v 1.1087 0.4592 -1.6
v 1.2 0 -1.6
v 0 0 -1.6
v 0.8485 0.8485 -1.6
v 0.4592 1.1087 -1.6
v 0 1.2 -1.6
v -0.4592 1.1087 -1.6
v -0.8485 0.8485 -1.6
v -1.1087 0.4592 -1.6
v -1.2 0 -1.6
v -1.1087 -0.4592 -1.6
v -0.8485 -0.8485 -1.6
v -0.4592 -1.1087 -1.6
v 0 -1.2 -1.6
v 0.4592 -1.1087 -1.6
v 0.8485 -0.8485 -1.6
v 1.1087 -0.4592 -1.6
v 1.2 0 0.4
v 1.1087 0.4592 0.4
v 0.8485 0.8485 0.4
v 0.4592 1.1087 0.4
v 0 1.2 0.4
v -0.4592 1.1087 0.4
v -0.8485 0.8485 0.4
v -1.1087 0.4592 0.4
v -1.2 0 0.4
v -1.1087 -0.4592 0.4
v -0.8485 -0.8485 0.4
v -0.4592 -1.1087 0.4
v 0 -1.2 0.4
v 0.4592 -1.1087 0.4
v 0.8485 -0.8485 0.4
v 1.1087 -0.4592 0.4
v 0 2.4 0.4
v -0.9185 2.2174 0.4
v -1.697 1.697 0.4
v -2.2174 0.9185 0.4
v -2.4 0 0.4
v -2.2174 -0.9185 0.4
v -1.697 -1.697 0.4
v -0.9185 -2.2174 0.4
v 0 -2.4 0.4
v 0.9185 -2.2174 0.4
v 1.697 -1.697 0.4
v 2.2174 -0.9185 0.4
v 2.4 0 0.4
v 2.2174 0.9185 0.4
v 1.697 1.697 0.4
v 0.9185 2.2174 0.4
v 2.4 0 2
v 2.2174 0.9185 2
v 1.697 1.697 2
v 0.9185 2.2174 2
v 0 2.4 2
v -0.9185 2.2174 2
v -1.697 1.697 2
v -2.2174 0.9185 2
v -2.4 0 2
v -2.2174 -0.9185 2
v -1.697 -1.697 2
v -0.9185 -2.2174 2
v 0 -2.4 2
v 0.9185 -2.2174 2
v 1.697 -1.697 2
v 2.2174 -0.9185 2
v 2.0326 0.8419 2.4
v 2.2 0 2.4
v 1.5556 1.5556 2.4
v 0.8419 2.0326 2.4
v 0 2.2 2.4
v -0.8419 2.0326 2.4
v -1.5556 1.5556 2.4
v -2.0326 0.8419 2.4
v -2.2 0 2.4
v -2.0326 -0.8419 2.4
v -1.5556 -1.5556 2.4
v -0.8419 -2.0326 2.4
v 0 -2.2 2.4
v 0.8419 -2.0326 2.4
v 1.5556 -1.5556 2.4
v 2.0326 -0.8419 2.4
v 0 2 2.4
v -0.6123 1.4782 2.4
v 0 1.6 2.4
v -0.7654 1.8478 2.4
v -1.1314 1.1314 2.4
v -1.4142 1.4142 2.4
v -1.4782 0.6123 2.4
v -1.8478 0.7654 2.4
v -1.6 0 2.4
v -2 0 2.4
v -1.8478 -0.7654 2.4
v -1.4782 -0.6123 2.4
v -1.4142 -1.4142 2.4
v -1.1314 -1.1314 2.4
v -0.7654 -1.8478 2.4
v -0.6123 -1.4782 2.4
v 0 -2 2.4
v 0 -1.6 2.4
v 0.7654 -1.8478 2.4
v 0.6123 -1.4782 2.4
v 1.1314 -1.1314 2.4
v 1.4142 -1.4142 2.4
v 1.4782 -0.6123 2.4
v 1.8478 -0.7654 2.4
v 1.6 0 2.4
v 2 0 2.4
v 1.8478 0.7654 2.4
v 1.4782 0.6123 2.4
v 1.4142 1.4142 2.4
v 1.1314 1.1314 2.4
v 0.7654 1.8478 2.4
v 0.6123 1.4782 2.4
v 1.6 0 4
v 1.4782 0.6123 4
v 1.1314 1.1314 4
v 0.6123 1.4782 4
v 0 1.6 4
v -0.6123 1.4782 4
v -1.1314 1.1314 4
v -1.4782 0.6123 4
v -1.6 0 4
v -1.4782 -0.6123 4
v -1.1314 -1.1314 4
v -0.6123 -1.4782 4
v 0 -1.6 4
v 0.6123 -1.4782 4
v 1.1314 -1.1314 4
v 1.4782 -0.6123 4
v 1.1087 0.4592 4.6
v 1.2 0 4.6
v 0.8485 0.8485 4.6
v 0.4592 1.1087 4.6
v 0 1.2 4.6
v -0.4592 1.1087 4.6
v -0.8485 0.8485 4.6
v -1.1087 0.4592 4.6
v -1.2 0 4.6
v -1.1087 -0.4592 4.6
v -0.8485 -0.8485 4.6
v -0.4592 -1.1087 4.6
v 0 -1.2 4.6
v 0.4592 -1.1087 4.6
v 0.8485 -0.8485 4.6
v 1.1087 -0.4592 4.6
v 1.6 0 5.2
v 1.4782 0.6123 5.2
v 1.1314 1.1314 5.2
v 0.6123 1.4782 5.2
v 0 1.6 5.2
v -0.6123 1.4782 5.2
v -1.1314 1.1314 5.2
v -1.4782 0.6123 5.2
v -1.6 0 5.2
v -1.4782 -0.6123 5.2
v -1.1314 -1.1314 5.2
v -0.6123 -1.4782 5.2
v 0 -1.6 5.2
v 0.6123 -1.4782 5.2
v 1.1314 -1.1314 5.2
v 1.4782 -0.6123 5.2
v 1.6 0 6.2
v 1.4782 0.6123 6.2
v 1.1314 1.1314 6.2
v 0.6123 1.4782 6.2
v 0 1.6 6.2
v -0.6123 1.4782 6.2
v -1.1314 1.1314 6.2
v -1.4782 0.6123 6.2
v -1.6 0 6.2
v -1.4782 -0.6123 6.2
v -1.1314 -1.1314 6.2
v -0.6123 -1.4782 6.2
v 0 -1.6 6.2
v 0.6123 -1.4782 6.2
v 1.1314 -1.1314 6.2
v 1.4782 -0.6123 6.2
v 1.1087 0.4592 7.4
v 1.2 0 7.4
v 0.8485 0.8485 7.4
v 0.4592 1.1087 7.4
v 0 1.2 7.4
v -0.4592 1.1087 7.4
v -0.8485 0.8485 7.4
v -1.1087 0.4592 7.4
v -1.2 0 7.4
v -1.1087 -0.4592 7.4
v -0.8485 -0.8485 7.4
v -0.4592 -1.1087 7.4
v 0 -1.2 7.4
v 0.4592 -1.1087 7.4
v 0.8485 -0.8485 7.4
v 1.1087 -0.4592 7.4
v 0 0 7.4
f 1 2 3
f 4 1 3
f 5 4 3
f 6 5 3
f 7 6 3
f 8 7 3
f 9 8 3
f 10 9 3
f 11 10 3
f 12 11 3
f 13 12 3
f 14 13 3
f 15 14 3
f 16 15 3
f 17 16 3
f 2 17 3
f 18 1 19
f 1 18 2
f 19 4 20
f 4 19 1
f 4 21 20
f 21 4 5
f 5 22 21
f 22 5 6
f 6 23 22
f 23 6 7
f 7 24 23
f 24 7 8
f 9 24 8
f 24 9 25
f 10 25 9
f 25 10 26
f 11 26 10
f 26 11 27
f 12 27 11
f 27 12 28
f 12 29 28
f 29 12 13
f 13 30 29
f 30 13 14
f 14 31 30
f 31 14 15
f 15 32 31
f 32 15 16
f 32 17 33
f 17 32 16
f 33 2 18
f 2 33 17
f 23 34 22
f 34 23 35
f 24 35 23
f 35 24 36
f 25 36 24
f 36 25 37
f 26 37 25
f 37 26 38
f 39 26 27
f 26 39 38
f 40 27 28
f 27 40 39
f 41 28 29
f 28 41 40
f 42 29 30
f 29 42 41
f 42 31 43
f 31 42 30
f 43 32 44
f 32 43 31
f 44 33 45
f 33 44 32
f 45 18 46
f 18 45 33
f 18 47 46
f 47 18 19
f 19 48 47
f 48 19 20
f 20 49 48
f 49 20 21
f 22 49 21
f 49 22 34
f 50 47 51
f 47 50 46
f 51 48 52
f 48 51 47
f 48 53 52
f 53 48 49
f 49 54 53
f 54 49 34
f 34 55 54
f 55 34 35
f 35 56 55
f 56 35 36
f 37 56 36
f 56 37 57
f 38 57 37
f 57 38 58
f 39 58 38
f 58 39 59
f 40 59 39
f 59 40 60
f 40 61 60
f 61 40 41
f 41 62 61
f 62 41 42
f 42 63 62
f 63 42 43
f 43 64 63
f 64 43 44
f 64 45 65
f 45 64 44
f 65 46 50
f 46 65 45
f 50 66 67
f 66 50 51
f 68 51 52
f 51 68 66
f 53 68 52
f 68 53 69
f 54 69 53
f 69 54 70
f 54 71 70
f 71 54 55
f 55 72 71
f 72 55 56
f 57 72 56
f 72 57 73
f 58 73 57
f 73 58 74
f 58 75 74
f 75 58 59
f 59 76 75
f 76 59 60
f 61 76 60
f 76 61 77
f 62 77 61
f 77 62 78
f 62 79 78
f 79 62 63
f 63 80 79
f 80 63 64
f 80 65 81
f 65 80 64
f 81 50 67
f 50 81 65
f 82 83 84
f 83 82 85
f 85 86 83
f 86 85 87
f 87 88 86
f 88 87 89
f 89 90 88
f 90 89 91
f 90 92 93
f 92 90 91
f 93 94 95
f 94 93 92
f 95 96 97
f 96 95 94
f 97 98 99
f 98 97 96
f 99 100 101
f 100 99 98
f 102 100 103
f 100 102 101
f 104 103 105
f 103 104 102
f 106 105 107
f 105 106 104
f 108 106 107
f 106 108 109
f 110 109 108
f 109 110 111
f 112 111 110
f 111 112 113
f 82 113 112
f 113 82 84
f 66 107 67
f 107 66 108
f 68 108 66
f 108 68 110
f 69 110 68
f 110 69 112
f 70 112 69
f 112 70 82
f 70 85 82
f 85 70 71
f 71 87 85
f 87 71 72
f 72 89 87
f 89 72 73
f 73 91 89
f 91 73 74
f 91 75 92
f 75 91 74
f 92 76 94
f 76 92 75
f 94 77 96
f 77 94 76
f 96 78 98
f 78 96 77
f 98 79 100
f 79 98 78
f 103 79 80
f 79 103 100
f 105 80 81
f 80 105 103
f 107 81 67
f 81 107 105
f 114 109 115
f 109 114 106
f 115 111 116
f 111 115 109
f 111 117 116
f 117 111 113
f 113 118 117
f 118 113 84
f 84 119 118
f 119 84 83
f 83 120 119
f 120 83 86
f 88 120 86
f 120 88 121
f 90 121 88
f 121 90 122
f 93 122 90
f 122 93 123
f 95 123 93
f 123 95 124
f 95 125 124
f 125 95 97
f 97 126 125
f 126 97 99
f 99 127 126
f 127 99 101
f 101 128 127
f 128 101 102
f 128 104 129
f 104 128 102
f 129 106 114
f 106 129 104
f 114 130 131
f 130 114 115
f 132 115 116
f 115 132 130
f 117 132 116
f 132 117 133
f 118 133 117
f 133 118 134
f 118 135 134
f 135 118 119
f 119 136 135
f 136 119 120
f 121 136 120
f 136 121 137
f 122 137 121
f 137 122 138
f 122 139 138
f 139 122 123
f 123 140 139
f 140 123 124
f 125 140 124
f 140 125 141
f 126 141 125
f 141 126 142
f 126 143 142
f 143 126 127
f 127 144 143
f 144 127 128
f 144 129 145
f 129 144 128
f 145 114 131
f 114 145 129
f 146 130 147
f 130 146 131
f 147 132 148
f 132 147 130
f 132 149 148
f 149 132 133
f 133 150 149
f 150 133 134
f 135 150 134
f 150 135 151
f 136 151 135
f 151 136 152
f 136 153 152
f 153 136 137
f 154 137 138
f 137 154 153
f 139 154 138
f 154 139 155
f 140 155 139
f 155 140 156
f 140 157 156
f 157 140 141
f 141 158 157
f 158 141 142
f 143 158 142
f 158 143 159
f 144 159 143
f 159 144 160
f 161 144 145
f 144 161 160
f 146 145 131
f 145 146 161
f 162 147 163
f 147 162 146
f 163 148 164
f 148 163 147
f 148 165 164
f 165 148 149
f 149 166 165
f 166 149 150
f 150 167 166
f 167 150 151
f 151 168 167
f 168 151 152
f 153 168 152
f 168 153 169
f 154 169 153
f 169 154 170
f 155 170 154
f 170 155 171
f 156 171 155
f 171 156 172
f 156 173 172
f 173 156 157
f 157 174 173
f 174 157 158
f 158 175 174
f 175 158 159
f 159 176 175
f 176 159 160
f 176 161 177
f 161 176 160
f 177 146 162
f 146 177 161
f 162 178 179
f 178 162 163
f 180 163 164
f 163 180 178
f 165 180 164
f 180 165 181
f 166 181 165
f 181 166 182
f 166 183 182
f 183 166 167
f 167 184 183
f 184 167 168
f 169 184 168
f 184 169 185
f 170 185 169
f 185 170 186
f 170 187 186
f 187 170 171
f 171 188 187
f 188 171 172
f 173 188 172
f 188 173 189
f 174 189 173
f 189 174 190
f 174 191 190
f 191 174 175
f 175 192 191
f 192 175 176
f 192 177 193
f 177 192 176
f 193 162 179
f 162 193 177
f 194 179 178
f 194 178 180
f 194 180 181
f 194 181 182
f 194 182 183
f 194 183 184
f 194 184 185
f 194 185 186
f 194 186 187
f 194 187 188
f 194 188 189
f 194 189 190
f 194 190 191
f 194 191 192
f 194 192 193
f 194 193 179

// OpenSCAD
// file: ../p/4-4ring4.scad
use <../lib.scad>
function ldraw_lib__4_4ring4() = [
// 0 Ring  4 x 1.0
// 0 Name: 4-4ring4.dat
// 0 Author: James Jessiman
// 0 !LDRAW_ORG Primitive UPDATE 2009-01
// 0 !LICENSE Licensed under CC BY 4.0 : see CAreadme.txt
// 
// 0 BFC CERTIFY CCW
  [0,"BFC","CERTIFY"],
  [0,"BFC","CCW"],
// 
// 0 !HISTORY 1998-12-15 [PTadmin] Official Update 1998-10
// 0 !HISTORY 2002-04-08 [BrickCaster] Modified for BFC compliance
// 0 !HISTORY 2002-04-25 [PTadmin] Official Update 2002-02
// 0 !HISTORY 2007-06-24 [PTadmin] Header formatted for Contributor Agreement
// 0 !HISTORY 2008-07-01 [PTadmin] Official Update 2008-01
// 0 !HISTORY 2008-08-26 [cwdee] Switch polygon winding and rename
// 0 !HISTORY 2009-05-02 [PTadmin] Official Update 2009-01
// 
// 
// 4 16 -1.9135 0 4.6195 -1.5308 0 3.6956 0 0 4 0 0 5
  [4,16,-1.9135,0,4.6195,-1.5308,0,3.6956,0,0,4,0,0,5],
// 4 16 -3.5355 0 3.5355 -2.8284 0 2.8284 -1.5308 0 3.6956 -1.9135 0 4.6195
  [4,16,-3.5355,0,3.5355,-2.8284,0,2.8284,-1.5308,0,3.6956,-1.9135,0,4.6195],
// 4 16 -4.6195 0 1.9135 -3.6956 0 1.5308 -2.8284 0 2.8284 -3.5355 0 3.5355
  [4,16,-4.6195,0,1.9135,-3.6956,0,1.5308,-2.8284,0,2.8284,-3.5355,0,3.5355],
// 4 16 -5 0 0 -4 0 0 -3.6956 0 1.5308 -4.6195 0 1.9135
  [4,16,-5,0,0,-4,0,0,-3.6956,0,1.5308,-4.6195,0,1.9135],
// 4 16 -4.6195 0 -1.9135 -3.6956 0 -1.5308 -4 0 0 -5 0 0
  [4,16,-4.6195,0,-1.9135,-3.6956,0,-1.5308,-4,0,0,-5,0,0],
// 4 16 -3.5355 0 -3.5355 -2.8284 0 -2.8284 -3.6956 0 -1.5308 -4.6195 0 -1.9135
  [4,16,-3.5355,0,-3.5355,-2.8284,0,-2.8284,-3.6956,0,-1.5308,-4.6195,0,-1.9135],
// 4 16 -1.9135 0 -4.6195 -1.5308 0 -3.6956 -2.8284 0 -2.8284 -3.5355 0 -3.5355
  [4,16,-1.9135,0,-4.6195,-1.5308,0,-3.6956,-2.8284,0,-2.8284,-3.5355,0,-3.5355],
// 4 16 0 0 -5 0 0 -4 -1.5308 0 -3.6956 -1.9135 0 -4.6195
  [4,16,0,0,-5,0,0,-4,-1.5308,0,-3.6956,-1.9135,0,-4.6195],
// 4 16 1.9135 0 -4.6195 1.5308 0 -3.6956 0 0 -4 0 0 -5
  [4,16,1.9135,0,-4.6195,1.5308,0,-3.6956,0,0,-4,0,0,-5],
// 4 16 3.5355 0 -3.5355 2.8284 0 -2.8284 1.5308 0 -3.6956 1.9135 0 -4.6195
  [4,16,3.5355,0,-3.5355,2.8284,0,-2.8284,1.5308,0,-3.6956,1.9135,0,-4.6195],
// 4 16 4.6195 0 -1.9135 3.6956 0 -1.5308 2.8284 0 -2.8284 3.5355 0 -3.5355
  [4,16,4.6195,0,-1.9135,3.6956,0,-1.5308,2.8284,0,-2.8284,3.5355,0,-3.5355],
// 4 16 5 0 0 4 0 0 3.6956 0 -1.5308 4.6195 0 -1.9135
  [4,16,5,0,0,4,0,0,3.6956,0,-1.5308,4.6195,0,-1.9135],
// 4 16 4.6195 0 1.9135 3.6956 0 1.5308 4 0 0 5 0 0
  [4,16,4.6195,0,1.9135,3.6956,0,1.5308,4,0,0,5,0,0],
// 4 16 3.5355 0 3.5355 2.8284 0 2.8284 3.6956 0 1.5308 4.6195 0 1.9135
  [4,16,3.5355,0,3.5355,2.8284,0,2.8284,3.6956,0,1.5308,4.6195,0,1.9135],
// 4 16 1.9135 0 4.6195 1.5308 0 3.6956 2.8284 0 2.8284 3.5355 0 3.5355
  [4,16,1.9135,0,4.6195,1.5308,0,3.6956,2.8284,0,2.8284,3.5355,0,3.5355],
// 4 16 0 0 5 0 0 4 1.5308 0 3.6956 1.9135 0 4.6195
  [4,16,0,0,5,0,0,4,1.5308,0,3.6956,1.9135,0,4.6195],
// 0
];
module ldraw_lib__4_4ring4(step=0, col=false, unit=2/5, alt=false, line=0.2, solid=!$preview)
    makepoly(ldraw_lib__4_4ring4(), step=step, col=col, unit=unit, alt=alt, line=line, solid=solid);
ldraw_lib__4_4ring4(line=0.2);
// file: ../p/4-4ring10.scad
use <../lib.scad>
function ldraw_lib__4_4ring10() = [
// 0 Ring 10 x 1.0
// 0 Name: 4-4ring10.dat
// 0 Author: Paul Easter [pneaster]
// 0 !LDRAW_ORG Primitive UPDATE 2024-02
// 0 !LICENSE Licensed under CC BY 4.0 : see CAreadme.txt
// 
// 0 BFC CERTIFY CCW
  [0,"BFC","CERTIFY"],
  [0,"BFC","CCW"],
// 
// 0 !HISTORY 2004-04-22 [PTadmin] Official Update 2004-02
// 0 !HISTORY 2007-06-24 [PTadmin] Header formatted for Contributor Agreement
// 0 !HISTORY 2008-07-01 [PTadmin] Official Update 2008-01
// 0 !HISTORY 2010-12-19 [MagFors] Corrected with Primitive Generator 2
// 0 !HISTORY 2010-12-31 [PTadmin] Official Update 2010-03
// 0 !HISTORY 2024-03-23 [OrionP] Moved from 4-4rin10.dat
// 0 !HISTORY 2024-03-24 [OrionP] Official Update 2024-02
// 
// 4 16 11 0 0 10.1629 0 4.2097 9.239 0 3.827 10 0 0
  [4,16,11,0,0,10.1629,0,4.2097,9.239,0,3.827,10,0,0],
// 4 16 10.1629 0 4.2097 7.7781 0 7.7781 7.071 0 7.071 9.239 0 3.827
  [4,16,10.1629,0,4.2097,7.7781,0,7.7781,7.071,0,7.071,9.239,0,3.827],
// 4 16 7.7781 0 7.7781 4.2097 0 10.1629 3.827 0 9.239 7.071 0 7.071
  [4,16,7.7781,0,7.7781,4.2097,0,10.1629,3.827,0,9.239,7.071,0,7.071],
// 4 16 4.2097 0 10.1629 0 0 11 0 0 10 3.827 0 9.239
  [4,16,4.2097,0,10.1629,0,0,11,0,0,10,3.827,0,9.239],
// 4 16 0 0 11 -4.2097 0 10.1629 -3.827 0 9.239 0 0 10
  [4,16,0,0,11,-4.2097,0,10.1629,-3.827,0,9.239,0,0,10],
// 4 16 -4.2097 0 10.1629 -7.7781 0 7.7781 -7.071 0 7.071 -3.827 0 9.239
  [4,16,-4.2097,0,10.1629,-7.7781,0,7.7781,-7.071,0,7.071,-3.827,0,9.239],
// 4 16 -7.7781 0 7.7781 -10.1629 0 4.2097 -9.239 0 3.827 -7.071 0 7.071
  [4,16,-7.7781,0,7.7781,-10.1629,0,4.2097,-9.239,0,3.827,-7.071,0,7.071],
// 4 16 -10.1629 0 4.2097 -11 0 0 -10 0 0 -9.239 0 3.827
  [4,16,-10.1629,0,4.2097,-11,0,0,-10,0,0,-9.239,0,3.827],
// 4 16 -11 0 0 -10.1629 0 -4.2097 -9.239 0 -3.827 -10 0 0
  [4,16,-11,0,0,-10.1629,0,-4.2097,-9.239,0,-3.827,-10,0,0],
// 4 16 -10.1629 0 -4.2097 -7.7781 0 -7.7781 -7.071 0 -7.071 -9.239 0 -3.827
  [4,16,-10.1629,0,-4.2097,-7.7781,0,-7.7781,-7.071,0,-7.071,-9.239,0,-3.827],
// 4 16 -7.7781 0 -7.7781 -4.2097 0 -10.1629 -3.827 0 -9.239 -7.071 0 -7.071
  [4,16,-7.7781,0,-7.7781,-4.2097,0,-10.1629,-3.827,0,-9.239,-7.071,0,-7.071],
// 4 16 -4.2097 0 -10.1629 0 0 -11 0 0 -10 -3.827 0 -9.239
  [4,16,-4.2097,0,-10.1629,0,0,-11,0,0,-10,-3.827,0,-9.239],
// 4 16 0 0 -11 4.2097 0 -10.1629 3.827 0 -9.239 0 0 -10
  [4,16,0,0,-11,4.2097,0,-10.1629,3.827,0,-9.239,0,0,-10],
// 4 16 4.2097 0 -10.1629 7.7781 0 -7.7781 7.071 0 -7.071 3.827 0 -9.239
  [4,16,4.2097,0,-10.1629,7.7781,0,-7.7781,7.071,0,-7.071,3.827,0,-9.239],
// 4 16 7.7781 0 -7.7781 10.1629 0 -4.2097 9.239 0 -3.827 7.071 0 -7.071
  [4,16,7.7781,0,-7.7781,10.1629,0,-4.2097,9.239,0,-3.827,7.071,0,-7.071],
// 4 16 10.1629 0 -4.2097 11 0 0 10 0 0 9.239 0 -3.827
  [4,16,10.1629,0,-4.2097,11,0,0,10,0,0,9.239,0,-3.827],
// 0 // Build by Primitive Generator 2
// 
];
module ldraw_lib__4_4ring10(step=0, col=false, unit=2/5, alt=false, line=0.2, solid=!$preview)
    makepoly(ldraw_lib__4_4ring10(), step=step, col=col, unit=unit, alt=alt, line=line, solid=solid);
ldraw_lib__4_4ring10(line=0.2);
// file: ../p/4-4ring1.scad
use <../lib.scad>
function ldraw_lib__4_4ring1() = [
// 0 Ring  1 x 1.0
// 0 Name: 4-4ring1.dat
// 0 Author: James Jessiman
// 0 !LDRAW_ORG Primitive UPDATE 2009-01
// 0 !LICENSE Licensed under CC BY 4.0 : see CAreadme.txt
// 
// 0 BFC CERTIFY CCW
  [0,"BFC","CERTIFY"],
  [0,"BFC","CCW"],
// 
// 0 !HISTORY 1998-12-15 [PTadmin] Official Update 1998-10
// 0 !HISTORY 2002-04-08 [BrickCaster] Modified for BFC compliance
// 0 !HISTORY 2002-04-25 [PTadmin] Official Update 2002-02
// 0 !HISTORY 2007-06-24 [PTadmin] Header formatted for Contributor Agreement
// 0 !HISTORY 2008-07-01 [PTadmin] Official Update 2008-01
// 0 !HISTORY 2008-08-26 [cwdee] Switch polygon winding and rename
// 0 !HISTORY 2009-05-02 [PTadmin] Official Update 2009-01
// 
// 
// 4 16 -0.7654 0 1.8478 -0.3827 0 0.9239 0 0 1 0 0 2
  [4,16,-0.7654,0,1.8478,-0.3827,0,0.9239,0,0,1,0,0,2],
// 4 16 -1.4142 0 1.4142 -0.7071 0 0.7071 -0.3827 0 0.9239 -0.7654 0 1.8478
  [4,16,-1.4142,0,1.4142,-0.7071,0,0.7071,-0.3827,0,0.9239,-0.7654,0,1.8478],
// 4 16 -1.8478 0 0.7654 -0.9239 0 0.3827 -0.7071 0 0.7071 -1.4142 0 1.41420
  [4,16,-1.8478,0,0.7654,-0.9239,0,0.3827,-0.7071,0,0.7071,-1.4142,0,1.41420],
// 4 16 -2 0 0 -1 0 0 -0.9239 0 0.3827 -1.8478 0 0.7654
  [4,16,-2,0,0,-1,0,0,-0.9239,0,0.3827,-1.8478,0,0.7654],
// 4 16 -1.8478 0 -0.7654 -0.9239 0 -0.3827 -1 0 0 -2 0 0
  [4,16,-1.8478,0,-0.7654,-0.9239,0,-0.3827,-1,0,0,-2,0,0],
// 4 16 -1.4142 0 -1.4142 -0.7071 0 -0.7071 -0.9239 0 -0.3827 -1.8478 0 -0.7654
  [4,16,-1.4142,0,-1.4142,-0.7071,0,-0.7071,-0.9239,0,-0.3827,-1.8478,0,-0.7654],
// 4 16 -0.7654 0 -1.8478 -0.3827 0 -0.9239 -0.7071 0 -0.7071 -1.4142 0 -1.4142
  [4,16,-0.7654,0,-1.8478,-0.3827,0,-0.9239,-0.7071,0,-0.7071,-1.4142,0,-1.4142],
// 4 16 0 0 -2 0 0 -1 -0.3827 0 -0.9239 -0.7654 0 -1.8478
  [4,16,0,0,-2,0,0,-1,-0.3827,0,-0.9239,-0.7654,0,-1.8478],
// 4 16 0.7654 0 -1.8478 0.3827 0 -0.9239 0 0 -1 0 0 -2
  [4,16,0.7654,0,-1.8478,0.3827,0,-0.9239,0,0,-1,0,0,-2],
// 4 16 1.4142 0 -1.4142 0.7071 0 -0.7071 0.3827 0 -0.9239 0.7654 0 -1.8478
  [4,16,1.4142,0,-1.4142,0.7071,0,-0.7071,0.3827,0,-0.9239,0.7654,0,-1.8478],
// 4 16 1.8478 0 -0.7654 0.9239 0 -0.3827 0.7071 0 -0.7071 1.4142 0 -1.4142
  [4,16,1.8478,0,-0.7654,0.9239,0,-0.3827,0.7071,0,-0.7071,1.4142,0,-1.4142],
// 4 16 2 0 0 1 0 0 0.9239 0 -0.3827 1.8478 0 -0.7654
  [4,16,2,0,0,1,0,0,0.9239,0,-0.3827,1.8478,0,-0.7654],
// 4 16 1.8478 0 0.7654 0.9239 0 0.3827 1 0 0 2 0 0
  [4,16,1.8478,0,0.7654,0.9239,0,0.3827,1,0,0,2,0,0],
// 4 16 1.4142 0 1.4142 0.7071 0 0.7071 0.9239 0 0.3827 1.8478 0 0.7654
  [4,16,1.4142,0,1.4142,0.7071,0,0.7071,0.9239,0,0.3827,1.8478,0,0.7654],
// 4 16 0.7654 0 1.8478 0.3827 0 0.9239 0.7071 0 0.7071 1.4142 0 1.4142
  [4,16,0.7654,0,1.8478,0.3827,0,0.9239,0.7071,0,0.7071,1.4142,0,1.4142],
// 4 16 0 0 2 0 0 1 0.3827 0 0.9239 0.7654 0 1.8478
  [4,16,0,0,2,0,0,1,0.3827,0,0.9239,0.7654,0,1.8478],
// 0
];
module ldraw_lib__4_4ring1(step=0, col=false, unit=2/5, alt=false, line=0.2, solid=!$preview)
    makepoly(ldraw_lib__4_4ring1(), step=step, col=col, unit=unit, alt=alt, line=line, solid=solid);
ldraw_lib__4_4ring1(line=0.2);
// file: ../p/4-4edge.scad
use <../lib.scad>
function ldraw_lib__4_4edge() = [
// 0 Circle 1.0
// 0 Name: 4-4edge.dat
// 0 Author: James Jessiman
// 0 !LDRAW_ORG Primitive UPDATE 2017-01
// 0 !LICENSE Licensed under CC BY 4.0 : see CAreadme.txt
// 
// 0 BFC CERTIFY CCW
  [0,"BFC","CERTIFY"],
  [0,"BFC","CCW"],
// 
// 0 !HISTORY 1998-12-15 [PTadmin] Official Update 1998-10
// 0 !HISTORY 2005-12-28 [PTadmin] Official Update 2005-01
// 0 !HISTORY 2007-06-24 [PTadmin] Header formatted for Contributor Agreement
// 0 !HISTORY 2008-07-01 [PTadmin] Official Update 2008-01
// 0 !HISTORY 2017-01-15 [Steffen] BFCed
// 0 !HISTORY 2017-12-30 [PTadmin] Official Update 2017-01
// 
// 
// 2 24 1 0 0 0.9239 0 0.3827
  [2,24,1,0,0,0.9239,0,0.3827],
// 2 24 0.9239 0 0.3827 0.7071 0 0.7071
  [2,24,0.9239,0,0.3827,0.7071,0,0.7071],
// 2 24 0.7071 0 0.7071 0.3827 0 0.9239
  [2,24,0.7071,0,0.7071,0.3827,0,0.9239],
// 2 24 0.3827 0 0.9239 0 0 1
  [2,24,0.3827,0,0.9239,0,0,1],
// 2 24 0 0 1 -0.3827 0 0.9239
  [2,24,0,0,1,-0.3827,0,0.9239],
// 2 24 -0.3827 0 0.9239 -0.7071 0 0.7071
  [2,24,-0.3827,0,0.9239,-0.7071,0,0.7071],
// 2 24 -0.7071 0 0.7071 -0.9239 0 0.3827
  [2,24,-0.7071,0,0.7071,-0.9239,0,0.3827],
// 2 24 -0.9239 0 0.3827 -1 0 -0
  [2,24,-0.9239,0,0.3827,-1,0,-0],
// 2 24 -1 0 -0 -0.9239 0 -0.3827
  [2,24,-1,0,-0,-0.9239,0,-0.3827],
// 2 24 -0.9239 0 -0.3827 -0.7071 0 -0.7071
  [2,24,-0.9239,0,-0.3827,-0.7071,0,-0.7071],
// 2 24 -0.7071 0 -0.7071 -0.3827 0 -0.9239
  [2,24,-0.7071,0,-0.7071,-0.3827,0,-0.9239],
// 2 24 -0.3827 0 -0.9239 0 0 -1
  [2,24,-0.3827,0,-0.9239,0,0,-1],
// 2 24 0 0 -1 0.3827 0 -0.9239
  [2,24,0,0,-1,0.3827,0,-0.9239],
// 2 24 0.3827 0 -0.9239 0.7071 0 -0.7071
  [2,24,0.3827,0,-0.9239,0.7071,0,-0.7071],
// 2 24 0.7071 0 -0.7071 0.9239 0 -0.3827
  [2,24,0.7071,0,-0.7071,0.9239,0,-0.3827],
// 2 24 0.9239 0 -0.3827 1 0 0
  [2,24,0.9239,0,-0.3827,1,0,0],
];
module ldraw_lib__4_4edge(step=0, col=false, unit=2/5, alt=false, line=0.2, solid=!$preview)
    makepoly(ldraw_lib__4_4edge(), step=step, col=col, unit=unit, alt=alt, line=line, solid=solid);
ldraw_lib__4_4edge(line=0.2);
// file: ../p/4-4disc.scad
use <../lib.scad>
function ldraw_lib__4_4disc() = [
// 0 Disc 1.0
// 0 Name: 4-4disc.dat
// 0 Author: James Jessiman
// 0 !LDRAW_ORG Primitive UPDATE 2002-02
// 0 !LICENSE Licensed under CC BY 4.0 : see CAreadme.txt
// 
// 0 BFC CERTIFY CCW
  [0,"BFC","CERTIFY"],
  [0,"BFC","CCW"],
// 
// 0 !HISTORY 1998-12-15 [PTadmin] Official Update 1998-10
// 0 !HISTORY 2002-03-23 [sbliss] Added BFC statement
// 0 !HISTORY 2002-04-25 [PTadmin] Official Update 2002-02
// 0 !HISTORY 2007-06-24 [PTadmin] Header formatted for Contributor Agreement
// 0 !HISTORY 2008-07-01 [PTadmin] Official Update 2008-01
// 
// 
// 3 16 0 0 0 1 0 0 0.9239 0 0.3827
  [3,16,0,0,0,1,0,0,0.9239,0,0.3827],
// 3 16 0 0 0 0.9239 0 0.3827 0.7071 0 0.7071
  [3,16,0,0,0,0.9239,0,0.3827,0.7071,0,0.7071],
// 3 16 0 0 0 0.7071 0 0.7071 0.3827 0 0.9239
  [3,16,0,0,0,0.7071,0,0.7071,0.3827,0,0.9239],
// 3 16 0 0 0 0.3827 0 0.9239 0 0 1
  [3,16,0,0,0,0.3827,0,0.9239,0,0,1],
// 3 16 0 0 0 0 0 1 -0.3827 0 0.9239
  [3,16,0,0,0,0,0,1,-0.3827,0,0.9239],
// 3 16 0 0 0 -0.3827 0 0.9239 -0.7071 0 0.7071
  [3,16,0,0,0,-0.3827,0,0.9239,-0.7071,0,0.7071],
// 3 16 0 0 0 -0.7071 0 0.7071 -0.9239 0 0.3827
  [3,16,0,0,0,-0.7071,0,0.7071,-0.9239,0,0.3827],
// 3 16 0 0 0 -0.9239 0 0.3827 -1 0 -0
  [3,16,0,0,0,-0.9239,0,0.3827,-1,0,-0],
// 3 16 0 0 0 -1 0 -0 -0.9239 0 -0.3827
  [3,16,0,0,0,-1,0,-0,-0.9239,0,-0.3827],
// 3 16 0 0 0 -0.9239 0 -0.3827 -0.7071 0 -0.7071
  [3,16,0,0,0,-0.9239,0,-0.3827,-0.7071,0,-0.7071],
// 3 16 0 0 0 -0.7071 0 -0.7071 -0.3827 0 -0.9239
  [3,16,0,0,0,-0.7071,0,-0.7071,-0.3827,0,-0.9239],
// 3 16 0 0 0 -0.3827 0 -0.9239 0 0 -1
  [3,16,0,0,0,-0.3827,0,-0.9239,0,0,-1],
// 3 16 0 0 0 0 0 -1 0.3827 0 -0.9239
  [3,16,0,0,0,0,0,-1,0.3827,0,-0.9239],
// 3 16 0 0 0 0.3827 0 -0.9239 0.7071 0 -0.7071
  [3,16,0,0,0,0.3827,0,-0.9239,0.7071,0,-0.7071],
// 3 16 0 0 0 0.7071 0 -0.7071 0.9239 0 -0.3827
  [3,16,0,0,0,0.7071,0,-0.7071,0.9239,0,-0.3827],
// 3 16 0 0 0 0.9239 0 -0.3827 1 0 0
  [3,16,0,0,0,0.9239,0,-0.3827,1,0,0],
// 0
];
module ldraw_lib__4_4disc(step=0, col=false, unit=2/5, alt=false, line=0.2, solid=!$preview)
    makepoly(ldraw_lib__4_4disc(), step=step, col=col, unit=unit, alt=alt, line=line, solid=solid);
ldraw_lib__4_4disc(line=0.2);
// file: ../p/4-4cyli.scad
use <../lib.scad>
function ldraw_lib__4_4cyli() = [
// 0 Cylinder 1.0
// 0 Name: 4-4cyli.dat
// 0 Author: James Jessiman
// 0 !LDRAW_ORG Primitive UPDATE 2005-01
// 0 !LICENSE Licensed under CC BY 4.0 : see CAreadme.txt
// 
// 0 BFC CERTIFY CCW
  [0,"BFC","CERTIFY"],
  [0,"BFC","CCW"],
// 
// 0 !HISTORY 1998-12-15 [PTadmin] Official Update 1998-10
// 0 !HISTORY 2002-03-23 [sbliss] Added BFC statement; merged headers from files in distributions LDraw 0.27 and Complete.
// 0 !HISTORY 2002-04-25 [PTadmin] Official Update 2002-02
// 0 !HISTORY 2004-12-14 [guyvivan] BFC CCW
// 0 !HISTORY 2005-12-28 [PTadmin] Official Update 2005-01
// 0 !HISTORY 2007-06-24 [PTadmin] Header formatted for Contributor Agreement
// 0 !HISTORY 2008-07-01 [PTadmin] Official Update 2008-01
// 
// 
// 4 16 1 1 0 0.9239 1 0.3827 0.9239 0 0.3827 1 0 0
  [4,16,1,1,0,0.9239,1,0.3827,0.9239,0,0.3827,1,0,0],
// 5 24 1 0 0 1 1 0 0.9239 0 0.3827 0.9239 0 -0.3827
  [5,24,1,0,0,1,1,0,0.9239,0,0.3827,0.9239,0,-0.3827],
// 4 16 0.9239 1 0.3827 0.7071 1 0.7071 0.7071 0 0.7071 0.9239 0 0.3827
  [4,16,0.9239,1,0.3827,0.7071,1,0.7071,0.7071,0,0.7071,0.9239,0,0.3827],
// 5 24 0.9239 0 0.3827 0.9239 1 0.3827 0.7071 0 0.7071 1 0 0
  [5,24,0.9239,0,0.3827,0.9239,1,0.3827,0.7071,0,0.7071,1,0,0],
// 4 16 0.7071 1 0.7071 0.3827 1 0.9239 0.3827 0 0.9239 0.7071 0 0.7071
  [4,16,0.7071,1,0.7071,0.3827,1,0.9239,0.3827,0,0.9239,0.7071,0,0.7071],
// 5 24 0.7071 0 0.7071 0.7071 1 0.7071 0.3827 0 0.9239 0.9239 0 0.3827
  [5,24,0.7071,0,0.7071,0.7071,1,0.7071,0.3827,0,0.9239,0.9239,0,0.3827],
// 4 16 0.3827 1 0.9239 0 1 1 0 0 1 0.3827 0 0.9239
  [4,16,0.3827,1,0.9239,0,1,1,0,0,1,0.3827,0,0.9239],
// 5 24 0.3827 0 0.9239 0.3827 1 0.9239 0 0 1 0.7071 0 0.7071
  [5,24,0.3827,0,0.9239,0.3827,1,0.9239,0,0,1,0.7071,0,0.7071],
// 4 16 0 1 1 -0.3827 1 0.9239 -0.3827 0 0.9239 0 0 1
  [4,16,0,1,1,-0.3827,1,0.9239,-0.3827,0,0.9239,0,0,1],
// 5 24 0 0 1 0 1 1 -0.3827 0 0.9239 0.3827 0 0.9239
  [5,24,0,0,1,0,1,1,-0.3827,0,0.9239,0.3827,0,0.9239],
// 4 16 -0.3827 1 0.9239 -0.7071 1 0.7071 -0.7071 0 0.7071 -0.3827 0 0.9239
  [4,16,-0.3827,1,0.9239,-0.7071,1,0.7071,-0.7071,0,0.7071,-0.3827,0,0.9239],
// 5 24 -0.3827 0 0.9239 -0.3827 1 0.9239 -0.7071 0 0.7071 0 0 1
  [5,24,-0.3827,0,0.9239,-0.3827,1,0.9239,-0.7071,0,0.7071,0,0,1],
// 4 16 -0.7071 1 0.7071 -0.9239 1 0.3827 -0.9239 0 0.3827 -0.7071 0 0.7071
  [4,16,-0.7071,1,0.7071,-0.9239,1,0.3827,-0.9239,0,0.3827,-0.7071,0,0.7071],
// 5 24 -0.7071 0 0.7071 -0.7071 1 0.7071 -0.9239 0 0.3827 -0.3827 0 0.9239
  [5,24,-0.7071,0,0.7071,-0.7071,1,0.7071,-0.9239,0,0.3827,-0.3827,0,0.9239],
// 4 16 -0.9239 1 0.3827 -1 1 0 -1 0 0 -0.9239 0 0.3827
  [4,16,-0.9239,1,0.3827,-1,1,0,-1,0,0,-0.9239,0,0.3827],
// 5 24 -0.9239 0 0.3827 -0.9239 1 0.3827 -1 0 0 -0.7071 0 0.7071
  [5,24,-0.9239,0,0.3827,-0.9239,1,0.3827,-1,0,0,-0.7071,0,0.7071],
// 4 16 -1 1 0 -0.9239 1 -0.3827 -0.9239 0 -0.3827 -1 0 0
  [4,16,-1,1,0,-0.9239,1,-0.3827,-0.9239,0,-0.3827,-1,0,0],
// 5 24 -1 0 0 -1 1 0 -0.9239 0 -0.3827 -0.9239 0 0.3827
  [5,24,-1,0,0,-1,1,0,-0.9239,0,-0.3827,-0.9239,0,0.3827],
// 4 16 -0.9239 1 -0.3827 -0.7071 1 -0.7071 -0.7071 0 -0.7071 -0.9239 0 -0.3827
  [4,16,-0.9239,1,-0.3827,-0.7071,1,-0.7071,-0.7071,0,-0.7071,-0.9239,0,-0.3827],
// 5 24 -0.9239 0 -0.3827 -0.9239 1 -0.3827 -0.7071 0 -0.7071 -1 0 0
  [5,24,-0.9239,0,-0.3827,-0.9239,1,-0.3827,-0.7071,0,-0.7071,-1,0,0],
// 4 16 -0.7071 1 -0.7071 -0.3827 1 -0.9239 -0.3827 0 -0.9239 -0.7071 0 -0.7071
  [4,16,-0.7071,1,-0.7071,-0.3827,1,-0.9239,-0.3827,0,-0.9239,-0.7071,0,-0.7071],
// 5 24 -0.7071 0 -0.7071 -0.7071 1 -0.7071 -0.3827 0 -0.9239 -0.9239 0 -0.3827
  [5,24,-0.7071,0,-0.7071,-0.7071,1,-0.7071,-0.3827,0,-0.9239,-0.9239,0,-0.3827],
// 4 16 -0.3827 1 -0.9239 0 1 -1 0 0 -1 -0.3827 0 -0.9239
  [4,16,-0.3827,1,-0.9239,0,1,-1,0,0,-1,-0.3827,0,-0.9239],
// 5 24 -0.3827 0 -0.9239 -0.3827 1 -0.9239 0 0 -1 -0.7071 0 -0.7071
  [5,24,-0.3827,0,-0.9239,-0.3827,1,-0.9239,0,0,-1,-0.7071,0,-0.7071],
// 4 16 0 1 -1 0.3827 1 -0.9239 0.3827 0 -0.9239 0 0 -1
  [4,16,0,1,-1,0.3827,1,-0.9239,0.3827,0,-0.9239,0,0,-1],
// 5 24 0 0 -1 0 1 -1 0.3827 0 -0.9239 -0.3827 0 -0.9239
  [5,24,0,0,-1,0,1,-1,0.3827,0,-0.9239,-0.3827,0,-0.9239],
// 4 16 0.3827 1 -0.9239 0.7071 1 -0.7071 0.7071 0 -0.7071 0.3827 0 -0.9239
  [4,16,0.3827,1,-0.9239,0.7071,1,-0.7071,0.7071,0,-0.7071,0.3827,0,-0.9239],
// 5 24 0.3827 0 -0.9239 0.3827 1 -0.9239 0.7071 0 -0.7071 0 0 -1
  [5,24,0.3827,0,-0.9239,0.3827,1,-0.9239,0.7071,0,-0.7071,0,0,-1],
// 4 16 0.7071 1 -0.7071 0.9239 1 -0.3827 0.9239 0 -0.3827 0.7071 0 -0.7071
  [4,16,0.7071,1,-0.7071,0.9239,1,-0.3827,0.9239,0,-0.3827,0.7071,0,-0.7071],
// 5 24 0.7071 0 -0.7071 0.7071 1 -0.7071 0.9239 0 -0.3827 0.3827 0 -0.9239
  [5,24,0.7071,0,-0.7071,0.7071,1,-0.7071,0.9239,0,-0.3827,0.3827,0,-0.9239],
// 4 16 0.9239 1 -0.3827 1 1 0 1 0 0 0.9239 0 -0.3827
  [4,16,0.9239,1,-0.3827,1,1,0,1,0,0,0.9239,0,-0.3827],
// 5 24 0.9239 0 -0.3827 0.9239 1 -0.3827 1 0 0 0.7071 0 -0.7071
  [5,24,0.9239,0,-0.3827,0.9239,1,-0.3827,1,0,0,0.7071,0,-0.7071],
// 0
];
module ldraw_lib__4_4cyli(step=0, col=false, unit=2/5, alt=false, line=0.2, solid=!$preview)
    makepoly(ldraw_lib__4_4cyli(), step=step, col=col, unit=unit, alt=alt, line=line, solid=solid);
ldraw_lib__4_4cyli(line=0.2);
// file: ../p/4-4con3.scad
use <../lib.scad>
function ldraw_lib__4_4con3() = [
// 0 Cone  3 x 1.0
// 0 Name: 4-4con3.dat
// 0 Author: Niels Karsdorp [nielsk]
// 0 !LDRAW_ORG Primitive UPDATE 2003-02
// 0 !LICENSE Licensed under CC BY 4.0 : see CAreadme.txt
// 
// 0 BFC CERTIFY CCW
  [0,"BFC","CERTIFY"],
  [0,"BFC","CCW"],
// 
// 0 !HISTORY 2003-08-01 [PTadmin] Official Update 2003-02
// 0 !HISTORY 2007-06-24 [PTadmin] Header formatted for Contributor Agreement
// 0 !HISTORY 2008-07-01 [PTadmin] Official Update 2008-01
// 
// 
// 5 24 3 1 0 4 0 0 2.7717 1 1.1481 2.7717 1 -1.1481
  [5,24,3,1,0,4,0,0,2.7717,1,1.1481,2.7717,1,-1.1481],
// 5 24 2.7717 1 1.1481 3.6956 0 1.5308 2.1213 1 2.1213 3 1 0
  [5,24,2.7717,1,1.1481,3.6956,0,1.5308,2.1213,1,2.1213,3,1,0],
// 5 24 2.1213 1 2.1213 2.8284 0 2.8284 1.1481 1 2.7717 2.7717 1 1.1481
  [5,24,2.1213,1,2.1213,2.8284,0,2.8284,1.1481,1,2.7717,2.7717,1,1.1481],
// 5 24 1.1481 1 2.7717 1.5308 0 3.6956 0 1 3 2.1213 1 2.1213
  [5,24,1.1481,1,2.7717,1.5308,0,3.6956,0,1,3,2.1213,1,2.1213],
// 5 24 0 1 3 0 0 4 -1.1481 1 2.7717 1.1481 1 2.7717
  [5,24,0,1,3,0,0,4,-1.1481,1,2.7717,1.1481,1,2.7717],
// 5 24 -1.1481 1 2.7717 -1.5308 0 3.6956 -2.1213 1 2.1213 0 1 3
  [5,24,-1.1481,1,2.7717,-1.5308,0,3.6956,-2.1213,1,2.1213,0,1,3],
// 5 24 -2.1213 1 2.1213 -2.8284 0 2.8284 -2.7717 1 1.1481 -1.1481 1 2.7717
  [5,24,-2.1213,1,2.1213,-2.8284,0,2.8284,-2.7717,1,1.1481,-1.1481,1,2.7717],
// 5 24 -2.7717 1 1.1481 -3.6956 0 1.5308 -3 1 0 -2.1213 1 2.1213
  [5,24,-2.7717,1,1.1481,-3.6956,0,1.5308,-3,1,0,-2.1213,1,2.1213],
// 5 24 -3 1 0 -4 0 0 -2.7717 1 -1.1481 -2.7717 1 1.1481
  [5,24,-3,1,0,-4,0,0,-2.7717,1,-1.1481,-2.7717,1,1.1481],
// 5 24 -2.7717 1 -1.1481 -3.6956 0 -1.5308 -2.1213 1 -2.1213 -3 1 0
  [5,24,-2.7717,1,-1.1481,-3.6956,0,-1.5308,-2.1213,1,-2.1213,-3,1,0],
// 5 24 -2.1213 1 -2.1213 -2.8284 0 -2.8284 -1.1481 1 -2.7717 -2.7717 1 -1.1481
  [5,24,-2.1213,1,-2.1213,-2.8284,0,-2.8284,-1.1481,1,-2.7717,-2.7717,1,-1.1481],
// 5 24 -1.1481 1 -2.7717 -1.5308 0 -3.6956 0 1 -3 -2.1213 1 -2.1213
  [5,24,-1.1481,1,-2.7717,-1.5308,0,-3.6956,0,1,-3,-2.1213,1,-2.1213],
// 5 24 0 1 -3 0 0 -4 1.1481 1 -2.7717 -1.1481 1 -2.7717
  [5,24,0,1,-3,0,0,-4,1.1481,1,-2.7717,-1.1481,1,-2.7717],
// 5 24 1.1481 1 -2.7717 1.5308 0 -3.6956 2.1213 1 -2.1213 0 1 -3
  [5,24,1.1481,1,-2.7717,1.5308,0,-3.6956,2.1213,1,-2.1213,0,1,-3],
// 5 24 2.1213 1 -2.1213 2.8284 0 -2.8284 2.7717 1 -1.1481 1.1481 1 -2.7717
  [5,24,2.1213,1,-2.1213,2.8284,0,-2.8284,2.7717,1,-1.1481,1.1481,1,-2.7717],
// 5 24 2.7717 1 -1.1481 3.6956 0 -1.5308 3 1 0 2.1213 1 -2.1213
  [5,24,2.7717,1,-1.1481,3.6956,0,-1.5308,3,1,0,2.1213,1,-2.1213],
// 
// 4 16 3 1 0 2.7717 1 1.1481 3.6956 0 1.5308 4 0 0
  [4,16,3,1,0,2.7717,1,1.1481,3.6956,0,1.5308,4,0,0],
// 4 16 2.7717 1 1.1481 2.1213 1 2.1213 2.8284 0 2.8284 3.6956 0 1.5308
  [4,16,2.7717,1,1.1481,2.1213,1,2.1213,2.8284,0,2.8284,3.6956,0,1.5308],
// 4 16 2.1213 1 2.1213 1.1481 1 2.7717 1.5308 0 3.6956 2.8284 0 2.8284
  [4,16,2.1213,1,2.1213,1.1481,1,2.7717,1.5308,0,3.6956,2.8284,0,2.8284],
// 4 16 1.1481 1 2.7717 0 1 3 0 0 4 1.5308 0 3.6956
  [4,16,1.1481,1,2.7717,0,1,3,0,0,4,1.5308,0,3.6956],
// 4 16 0 1 3 -1.1481 1 2.7717 -1.5308 0 3.6956 0 0 4
  [4,16,0,1,3,-1.1481,1,2.7717,-1.5308,0,3.6956,0,0,4],
// 4 16 -1.1481 1 2.7717 -2.1213 1 2.1213 -2.8284 0 2.8284 -1.5308 0 3.6956
  [4,16,-1.1481,1,2.7717,-2.1213,1,2.1213,-2.8284,0,2.8284,-1.5308,0,3.6956],
// 4 16 -2.1213 1 2.1213 -2.7717 1 1.1481 -3.6956 0 1.5308 -2.8284 0 2.8284
  [4,16,-2.1213,1,2.1213,-2.7717,1,1.1481,-3.6956,0,1.5308,-2.8284,0,2.8284],
// 4 16 -2.7717 1 1.1481 -3 1 0 -4 0 0 -3.6956 0 1.5308
  [4,16,-2.7717,1,1.1481,-3,1,0,-4,0,0,-3.6956,0,1.5308],
// 4 16 -3 1 0 -2.7717 1 -1.1481 -3.6956 0 -1.5308 -4 0 0
  [4,16,-3,1,0,-2.7717,1,-1.1481,-3.6956,0,-1.5308,-4,0,0],
// 4 16 -2.7717 1 -1.1481 -2.1213 1 -2.1213 -2.8284 0 -2.8284 -3.6956 0 -1.5308
  [4,16,-2.7717,1,-1.1481,-2.1213,1,-2.1213,-2.8284,0,-2.8284,-3.6956,0,-1.5308],
// 4 16 -2.1213 1 -2.1213 -1.1481 1 -2.7717 -1.5308 0 -3.6956 -2.8284 0 -2.8284
  [4,16,-2.1213,1,-2.1213,-1.1481,1,-2.7717,-1.5308,0,-3.6956,-2.8284,0,-2.8284],
// 4 16 -1.1481 1 -2.7717 0 1 -3 0 0 -4 -1.5308 0 -3.6956
  [4,16,-1.1481,1,-2.7717,0,1,-3,0,0,-4,-1.5308,0,-3.6956],
// 4 16 0 1 -3 1.1481 1 -2.7717 1.5308 0 -3.6956 0 0 -4
  [4,16,0,1,-3,1.1481,1,-2.7717,1.5308,0,-3.6956,0,0,-4],
// 4 16 1.1481 1 -2.7717 2.1213 1 -2.1213 2.8284 0 -2.8284 1.5308 0 -3.6956
  [4,16,1.1481,1,-2.7717,2.1213,1,-2.1213,2.8284,0,-2.8284,1.5308,0,-3.6956],
// 4 16 2.1213 1 -2.1213 2.7717 1 -1.1481 3.6956 0 -1.5308 2.8284 0 -2.8284
  [4,16,2.1213,1,-2.1213,2.7717,1,-1.1481,3.6956,0,-1.5308,2.8284,0,-2.8284],
// 4 16 2.7717 1 -1.1481 3 1 0 4 0 0 3.6956 0 -1.5308
  [4,16,2.7717,1,-1.1481,3,1,0,4,0,0,3.6956,0,-1.5308],
// 
// 0
// 
];
module ldraw_lib__4_4con3(step=0, col=false, unit=2/5, alt=false, line=0.2, solid=!$preview)
    makepoly(ldraw_lib__4_4con3(), step=step, col=col, unit=unit, alt=alt, line=line, solid=solid);
ldraw_lib__4_4con3(line=0.2);
// file: ../p/4-4con11.scad
use <../lib.scad>
function ldraw_lib__4_4con11() = [
// 0 Cone 11 x 1.0
// 0 Name: 4-4con11.dat
// 0 Author: Willy Tschager [Holly-Wood]
// 0 !LDRAW_ORG Primitive UPDATE 2024-01
// 0 !LICENSE Licensed under CC BY 4.0 : see CAreadme.txt
// 
// 0 BFC CERTIFY CCW
  [0,"BFC","CERTIFY"],
  [0,"BFC","CCW"],
// 
// 0 !HISTORY 2009-12-29 [PTadmin] Official Update 2009-03
// 0 !HISTORY 2012-02-16 [Philo] Changed to CCW
// 0 !HISTORY 2012-03-30 [PTadmin] Official Update 2012-01
// 0 !HISTORY 2024-01-19 [Holly-Wood] Complete regeneration, original by jriley
// 0 !HISTORY 2024-01-29 [OrionP] Official Update 2024-01
// 
// 4 16 11 1 0 10.1629 1 4.2097 11.0868 0 4.5924 12 0 0
  [4,16,11,1,0,10.1629,1,4.2097,11.0868,0,4.5924,12,0,0],
// 4 16 10.1629 1 4.2097 7.7781 1 7.7781 8.4852 0 8.4852 11.0868 0 4.5924
  [4,16,10.1629,1,4.2097,7.7781,1,7.7781,8.4852,0,8.4852,11.0868,0,4.5924],
// 4 16 7.7781 1 7.7781 4.2097 1 10.1629 4.5924 0 11.0868 8.4852 0 8.4852
  [4,16,7.7781,1,7.7781,4.2097,1,10.1629,4.5924,0,11.0868,8.4852,0,8.4852],
// 4 16 4.2097 1 10.1629 0 1 11 0 0 12 4.5924 0 11.0868
  [4,16,4.2097,1,10.1629,0,1,11,0,0,12,4.5924,0,11.0868],
// 4 16 0 1 11 -4.2097 1 10.1629 -4.5924 0 11.0868 0 0 12
  [4,16,0,1,11,-4.2097,1,10.1629,-4.5924,0,11.0868,0,0,12],
// 4 16 -4.2097 1 10.1629 -7.7781 1 7.7781 -8.4852 0 8.4852 -4.5924 0 11.0868
  [4,16,-4.2097,1,10.1629,-7.7781,1,7.7781,-8.4852,0,8.4852,-4.5924,0,11.0868],
// 4 16 -7.7781 1 7.7781 -10.1629 1 4.2097 -11.0868 0 4.5924 -8.4852 0 8.4852
  [4,16,-7.7781,1,7.7781,-10.1629,1,4.2097,-11.0868,0,4.5924,-8.4852,0,8.4852],
// 4 16 -10.1629 1 4.2097 -11 1 0 -12 0 0 -11.0868 0 4.5924
  [4,16,-10.1629,1,4.2097,-11,1,0,-12,0,0,-11.0868,0,4.5924],
// 4 16 -11 1 0 -10.1629 1 -4.2097 -11.0868 0 -4.5924 -12 0 0
  [4,16,-11,1,0,-10.1629,1,-4.2097,-11.0868,0,-4.5924,-12,0,0],
// 4 16 -10.1629 1 -4.2097 -7.7781 1 -7.7781 -8.4852 0 -8.4852 -11.0868 0 -4.5924
  [4,16,-10.1629,1,-4.2097,-7.7781,1,-7.7781,-8.4852,0,-8.4852,-11.0868,0,-4.5924],
// 4 16 -7.7781 1 -7.7781 -4.2097 1 -10.1629 -4.5924 0 -11.0868 -8.4852 0 -8.4852
  [4,16,-7.7781,1,-7.7781,-4.2097,1,-10.1629,-4.5924,0,-11.0868,-8.4852,0,-8.4852],
// 4 16 -4.2097 1 -10.1629 0 1 -11 0 0 -12 -4.5924 0 -11.0868
  [4,16,-4.2097,1,-10.1629,0,1,-11,0,0,-12,-4.5924,0,-11.0868],
// 4 16 0 1 -11 4.2097 1 -10.1629 4.5924 0 -11.0868 0 0 -12
  [4,16,0,1,-11,4.2097,1,-10.1629,4.5924,0,-11.0868,0,0,-12],
// 4 16 4.2097 1 -10.1629 7.7781 1 -7.7781 8.4852 0 -8.4852 4.5924 0 -11.0868
  [4,16,4.2097,1,-10.1629,7.7781,1,-7.7781,8.4852,0,-8.4852,4.5924,0,-11.0868],
// 4 16 7.7781 1 -7.7781 10.1629 1 -4.2097 11.0868 0 -4.5924 8.4852 0 -8.4852
  [4,16,7.7781,1,-7.7781,10.1629,1,-4.2097,11.0868,0,-4.5924,8.4852,0,-8.4852],
// 4 16 10.1629 1 -4.2097 11 1 0 12 0 0 11.0868 0 -4.5924
  [4,16,10.1629,1,-4.2097,11,1,0,12,0,0,11.0868,0,-4.5924],
// 0 // conditional lines
// 5 24 11 1 0 12 0 0 10.1629 1 -4.2097 10.1629 1 4.2097
  [5,24,11,1,0,12,0,0,10.1629,1,-4.2097,10.1629,1,4.2097],
// 5 24 10.1629 1 4.2097 11.0868 0 4.5924 11 1 0 7.7781 1 7.7781
  [5,24,10.1629,1,4.2097,11.0868,0,4.5924,11,1,0,7.7781,1,7.7781],
// 5 24 7.7781 1 7.7781 8.4852 0 8.4852 10.1629 1 4.2097 4.2097 1 10.1629
  [5,24,7.7781,1,7.7781,8.4852,0,8.4852,10.1629,1,4.2097,4.2097,1,10.1629],
// 5 24 4.2097 1 10.1629 4.5924 0 11.0868 7.7781 1 7.7781 0 1 11
  [5,24,4.2097,1,10.1629,4.5924,0,11.0868,7.7781,1,7.7781,0,1,11],
// 5 24 0 1 11 0 0 12 4.2097 1 10.1629 -4.2097 1 10.1629
  [5,24,0,1,11,0,0,12,4.2097,1,10.1629,-4.2097,1,10.1629],
// 5 24 -4.2097 1 10.1629 -4.5924 0 11.0868 0 1 11 -7.7781 1 7.7781
  [5,24,-4.2097,1,10.1629,-4.5924,0,11.0868,0,1,11,-7.7781,1,7.7781],
// 5 24 -7.7781 1 7.7781 -8.4852 0 8.4852 -4.2097 1 10.1629 -10.1629 1 4.2097
  [5,24,-7.7781,1,7.7781,-8.4852,0,8.4852,-4.2097,1,10.1629,-10.1629,1,4.2097],
// 5 24 -10.1629 1 4.2097 -11.0868 0 4.5924 -7.7781 1 7.7781 -11 1 0
  [5,24,-10.1629,1,4.2097,-11.0868,0,4.5924,-7.7781,1,7.7781,-11,1,0],
// 5 24 -11 1 0 -12 0 0 -10.1629 1 4.2097 -10.1629 1 -4.2097
  [5,24,-11,1,0,-12,0,0,-10.1629,1,4.2097,-10.1629,1,-4.2097],
// 5 24 -10.1629 1 -4.2097 -11.0868 0 -4.5924 -11 1 0 -7.7781 1 -7.7781
  [5,24,-10.1629,1,-4.2097,-11.0868,0,-4.5924,-11,1,0,-7.7781,1,-7.7781],
// 5 24 -7.7781 1 -7.7781 -8.4852 0 -8.4852 -10.1629 1 -4.2097 -4.2097 1 -10.1629
  [5,24,-7.7781,1,-7.7781,-8.4852,0,-8.4852,-10.1629,1,-4.2097,-4.2097,1,-10.1629],
// 5 24 -4.2097 1 -10.1629 -4.5924 0 -11.0868 -7.7781 1 -7.7781 0 1 -11
  [5,24,-4.2097,1,-10.1629,-4.5924,0,-11.0868,-7.7781,1,-7.7781,0,1,-11],
// 5 24 0 1 -11 0 0 -12 -4.2097 1 -10.1629 4.2097 1 -10.1629
  [5,24,0,1,-11,0,0,-12,-4.2097,1,-10.1629,4.2097,1,-10.1629],
// 5 24 4.2097 1 -10.1629 4.5924 0 -11.0868 0 1 -11 7.7781 1 -7.7781
  [5,24,4.2097,1,-10.1629,4.5924,0,-11.0868,0,1,-11,7.7781,1,-7.7781],
// 5 24 7.7781 1 -7.7781 8.4852 0 -8.4852 4.2097 1 -10.1629 10.1629 1 -4.2097
  [5,24,7.7781,1,-7.7781,8.4852,0,-8.4852,4.2097,1,-10.1629,10.1629,1,-4.2097],
// 5 24 10.1629 1 -4.2097 11.0868 0 -4.5924 7.7781 1 -7.7781 11 1 0
  [5,24,10.1629,1,-4.2097,11.0868,0,-4.5924,7.7781,1,-7.7781,11,1,0],
// 0 // Build by LDPartEditor (PrimGen 2.X)
];
module ldraw_lib__4_4con11(step=0, col=false, unit=2/5, alt=false, line=0.2, solid=!$preview)
    makepoly(ldraw_lib__4_4con11(), step=step, col=col, unit=unit, alt=alt, line=line, solid=solid);
ldraw_lib__4_4con11(line=0.2);
// main file
use <../lib.scad>
use <../p/4-4con11.scad>
use <../p/4-4con3.scad>
use <../p/4-4cyli.scad>
use <../p/4-4disc.scad>
use <../p/4-4edge.scad>
use <../p/4-4ring1.scad>
use <../p/4-4ring10.scad>
use <../p/4-4ring4.scad>
function ldraw_lib__u9057() = [
// 0 ~Electric Train 12V Power Pickup Plug Pin Type 1
// 0 Name: u9057.dat
// 0 Author: Niels Karsdorp [nielsk]
// 0 !LDRAW_ORG Part UPDATE 2025-09
// 0 !LICENSE Licensed under CC BY 4.0 : see CAreadme.txt
// 
// 0 BFC CERTIFY CCW
  [0,"BFC","CERTIFY"],
  [0,"BFC","CCW"],
// 
// 0 !CMDLINE -c494
// 
// 0 !HISTORY 2012-02-03 [Steffen] replaced color 383 by 494
// 0 !HISTORY 2012-03-30 [PTadmin] Official Update 2012-01
// 0 !HISTORY 2024-03-23 [OrionP] Updated ring primitives
// 0 !HISTORY 2024-03-24 [OrionP] Official Update 2024-02
// 0 !HISTORY 2025-09-27 [OrionP] Changed winding to CCW
// 0 !HISTORY 2025-09-29 [OrionP] Official Update 2025-09
// 
// 1 16 0 4 0 3 0 0 0 1 0 0 0 3 4-4edge.dat
  [1,16,0,4,0,3,0,0,0,1,0,0,0,3, ldraw_lib__4_4edge()],
// 1 16 0 -1 0 3 0 0 0 1 0 0 0 3 4-4edge.dat
  [1,16,0,-1,0,3,0,0,0,1,0,0,0,3, ldraw_lib__4_4edge()],
// 1 16 0 -1 0 6 0 0 0 1 0 0 0 6 4-4edge.dat
  [1,16,0,-1,0,6,0,0,0,1,0,0,0,6, ldraw_lib__4_4edge()],
// 1 16 0 -5 0 6 0 0 0 1 0 0 0 6 4-4edge.dat
  [1,16,0,-5,0,6,0,0,0,1,0,0,0,6, ldraw_lib__4_4edge()],
// 1 16 0 -6 0 5.5 0 0 0 1 0 0 0 5.5 4-4edge.dat
  [1,16,0,-6,0,5.5,0,0,0,1,0,0,0,5.5, ldraw_lib__4_4edge()],
// 1 16 0 -6 0 4 0 0 0 1 0 0 0 4 4-4edge.dat
  [1,16,0,-6,0,4,0,0,0,1,0,0,0,4, ldraw_lib__4_4edge()],
// 1 16 0 -10 0 4 0 0 0 1 0 0 0 4 4-4edge.dat
  [1,16,0,-10,0,4,0,0,0,1,0,0,0,4, ldraw_lib__4_4edge()],
// 1 16 0 -11.5 0 3 0 0 0 1 0 0 0 3 4-4edge.dat
  [1,16,0,-11.5,0,3,0,0,0,1,0,0,0,3, ldraw_lib__4_4edge()],
// 1 16 0 -13 0 4 0 0 0 1 0 0 0 4 4-4edge.dat
  [1,16,0,-13,0,4,0,0,0,1,0,0,0,4, ldraw_lib__4_4edge()],
// 1 16 0 -15.5 0 4 0 0 0 1 0 0 0 4 4-4edge.dat
  [1,16,0,-15.5,0,4,0,0,0,1,0,0,0,4, ldraw_lib__4_4edge()],
// 1 16 0 -18.5 0 3 0 0 0 1 0 0 0 3 4-4edge.dat
  [1,16,0,-18.5,0,3,0,0,0,1,0,0,0,3, ldraw_lib__4_4edge()],
// 1 16 0 4 0 3 0 0 0 -1 0 0 0 3 4-4disc.dat
  [1,16,0,4,0,3,0,0,0,-1,0,0,0,3, ldraw_lib__4_4disc()],
// 1 16 0 4 0 3 0 0 0 -5 0 0 0 3 4-4cyli.dat
  [1,16,0,4,0,3,0,0,0,-5,0,0,0,3, ldraw_lib__4_4cyli()],
// 1 16 0 -1 0 3 0 0 0 -1 0 0 0 3 4-4ring1.dat
  [1,16,0,-1,0,3,0,0,0,-1,0,0,0,3, ldraw_lib__4_4ring1()],
// 1 16 0 -1 0 6 0 0 0 -4 0 0 0 6 4-4cyli.dat
  [1,16,0,-1,0,6,0,0,0,-4,0,0,0,6, ldraw_lib__4_4cyli()],
// 1 16 0 -5 0 0.5 0 0 0 -1 0 0 0 0.5 4-4con11.dat
  [1,16,0,-5,0,0.5,0,0,0,-1,0,0,0,0.5, ldraw_lib__4_4con11()],
// 1 16 0 -6 0 1 0 0 0 1 0 0 0 1 4-4ring4.dat
  [1,16,0,-6,0,1,0,0,0,1,0,0,0,1, ldraw_lib__4_4ring4()],
// 1 16 0 -6 0 0.5 0 0 0 1 0 0 0 0.5 4-4ring10.dat
  [1,16,0,-6,0,0.5,0,0,0,1,0,0,0,0.5, ldraw_lib__4_4ring10()],
// 1 16 0 -6 0 4 0 0 0 -4 0 0 0 4 4-4cyli.dat
  [1,16,0,-6,0,4,0,0,0,-4,0,0,0,4, ldraw_lib__4_4cyli()],
// 1 16 0 -10 0 1 0 0 0 -1.5 0 0 0 1 4-4con3.dat
  [1,16,0,-10,0,1,0,0,0,-1.5,0,0,0,1, ldraw_lib__4_4con3()],
// 1 16 0 -13 0 1 0 0 0 1.5 0 0 0 1 4-4con3.dat
  [1,16,0,-13,0,1,0,0,0,1.5,0,0,0,1, ldraw_lib__4_4con3()],
// 1 16 0 -13 0 4 0 0 0 -2.5 0 0 0 4 4-4cyli.dat
  [1,16,0,-13,0,4,0,0,0,-2.5,0,0,0,4, ldraw_lib__4_4cyli()],
// 1 16 0 -15.5 0 1 0 0 0 -3 0 0 0 1 4-4con3.dat
  [1,16,0,-15.5,0,1,0,0,0,-3,0,0,0,1, ldraw_lib__4_4con3()],
// 1 16 0 -18.5 0 3 0 0 0 1 0 0 0 3 4-4disc.dat
  [1,16,0,-18.5,0,3,0,0,0,1,0,0,0,3, ldraw_lib__4_4disc()],
];
module ldraw_lib__u9057(step=0, col=false, unit=2/5, alt=false, line=0.2, solid=!$preview)
    makepoly(ldraw_lib__u9057(), step=step, col=col, unit=unit, alt=alt, line=line, solid=solid);
ldraw_lib__u9057(line=0.2);
